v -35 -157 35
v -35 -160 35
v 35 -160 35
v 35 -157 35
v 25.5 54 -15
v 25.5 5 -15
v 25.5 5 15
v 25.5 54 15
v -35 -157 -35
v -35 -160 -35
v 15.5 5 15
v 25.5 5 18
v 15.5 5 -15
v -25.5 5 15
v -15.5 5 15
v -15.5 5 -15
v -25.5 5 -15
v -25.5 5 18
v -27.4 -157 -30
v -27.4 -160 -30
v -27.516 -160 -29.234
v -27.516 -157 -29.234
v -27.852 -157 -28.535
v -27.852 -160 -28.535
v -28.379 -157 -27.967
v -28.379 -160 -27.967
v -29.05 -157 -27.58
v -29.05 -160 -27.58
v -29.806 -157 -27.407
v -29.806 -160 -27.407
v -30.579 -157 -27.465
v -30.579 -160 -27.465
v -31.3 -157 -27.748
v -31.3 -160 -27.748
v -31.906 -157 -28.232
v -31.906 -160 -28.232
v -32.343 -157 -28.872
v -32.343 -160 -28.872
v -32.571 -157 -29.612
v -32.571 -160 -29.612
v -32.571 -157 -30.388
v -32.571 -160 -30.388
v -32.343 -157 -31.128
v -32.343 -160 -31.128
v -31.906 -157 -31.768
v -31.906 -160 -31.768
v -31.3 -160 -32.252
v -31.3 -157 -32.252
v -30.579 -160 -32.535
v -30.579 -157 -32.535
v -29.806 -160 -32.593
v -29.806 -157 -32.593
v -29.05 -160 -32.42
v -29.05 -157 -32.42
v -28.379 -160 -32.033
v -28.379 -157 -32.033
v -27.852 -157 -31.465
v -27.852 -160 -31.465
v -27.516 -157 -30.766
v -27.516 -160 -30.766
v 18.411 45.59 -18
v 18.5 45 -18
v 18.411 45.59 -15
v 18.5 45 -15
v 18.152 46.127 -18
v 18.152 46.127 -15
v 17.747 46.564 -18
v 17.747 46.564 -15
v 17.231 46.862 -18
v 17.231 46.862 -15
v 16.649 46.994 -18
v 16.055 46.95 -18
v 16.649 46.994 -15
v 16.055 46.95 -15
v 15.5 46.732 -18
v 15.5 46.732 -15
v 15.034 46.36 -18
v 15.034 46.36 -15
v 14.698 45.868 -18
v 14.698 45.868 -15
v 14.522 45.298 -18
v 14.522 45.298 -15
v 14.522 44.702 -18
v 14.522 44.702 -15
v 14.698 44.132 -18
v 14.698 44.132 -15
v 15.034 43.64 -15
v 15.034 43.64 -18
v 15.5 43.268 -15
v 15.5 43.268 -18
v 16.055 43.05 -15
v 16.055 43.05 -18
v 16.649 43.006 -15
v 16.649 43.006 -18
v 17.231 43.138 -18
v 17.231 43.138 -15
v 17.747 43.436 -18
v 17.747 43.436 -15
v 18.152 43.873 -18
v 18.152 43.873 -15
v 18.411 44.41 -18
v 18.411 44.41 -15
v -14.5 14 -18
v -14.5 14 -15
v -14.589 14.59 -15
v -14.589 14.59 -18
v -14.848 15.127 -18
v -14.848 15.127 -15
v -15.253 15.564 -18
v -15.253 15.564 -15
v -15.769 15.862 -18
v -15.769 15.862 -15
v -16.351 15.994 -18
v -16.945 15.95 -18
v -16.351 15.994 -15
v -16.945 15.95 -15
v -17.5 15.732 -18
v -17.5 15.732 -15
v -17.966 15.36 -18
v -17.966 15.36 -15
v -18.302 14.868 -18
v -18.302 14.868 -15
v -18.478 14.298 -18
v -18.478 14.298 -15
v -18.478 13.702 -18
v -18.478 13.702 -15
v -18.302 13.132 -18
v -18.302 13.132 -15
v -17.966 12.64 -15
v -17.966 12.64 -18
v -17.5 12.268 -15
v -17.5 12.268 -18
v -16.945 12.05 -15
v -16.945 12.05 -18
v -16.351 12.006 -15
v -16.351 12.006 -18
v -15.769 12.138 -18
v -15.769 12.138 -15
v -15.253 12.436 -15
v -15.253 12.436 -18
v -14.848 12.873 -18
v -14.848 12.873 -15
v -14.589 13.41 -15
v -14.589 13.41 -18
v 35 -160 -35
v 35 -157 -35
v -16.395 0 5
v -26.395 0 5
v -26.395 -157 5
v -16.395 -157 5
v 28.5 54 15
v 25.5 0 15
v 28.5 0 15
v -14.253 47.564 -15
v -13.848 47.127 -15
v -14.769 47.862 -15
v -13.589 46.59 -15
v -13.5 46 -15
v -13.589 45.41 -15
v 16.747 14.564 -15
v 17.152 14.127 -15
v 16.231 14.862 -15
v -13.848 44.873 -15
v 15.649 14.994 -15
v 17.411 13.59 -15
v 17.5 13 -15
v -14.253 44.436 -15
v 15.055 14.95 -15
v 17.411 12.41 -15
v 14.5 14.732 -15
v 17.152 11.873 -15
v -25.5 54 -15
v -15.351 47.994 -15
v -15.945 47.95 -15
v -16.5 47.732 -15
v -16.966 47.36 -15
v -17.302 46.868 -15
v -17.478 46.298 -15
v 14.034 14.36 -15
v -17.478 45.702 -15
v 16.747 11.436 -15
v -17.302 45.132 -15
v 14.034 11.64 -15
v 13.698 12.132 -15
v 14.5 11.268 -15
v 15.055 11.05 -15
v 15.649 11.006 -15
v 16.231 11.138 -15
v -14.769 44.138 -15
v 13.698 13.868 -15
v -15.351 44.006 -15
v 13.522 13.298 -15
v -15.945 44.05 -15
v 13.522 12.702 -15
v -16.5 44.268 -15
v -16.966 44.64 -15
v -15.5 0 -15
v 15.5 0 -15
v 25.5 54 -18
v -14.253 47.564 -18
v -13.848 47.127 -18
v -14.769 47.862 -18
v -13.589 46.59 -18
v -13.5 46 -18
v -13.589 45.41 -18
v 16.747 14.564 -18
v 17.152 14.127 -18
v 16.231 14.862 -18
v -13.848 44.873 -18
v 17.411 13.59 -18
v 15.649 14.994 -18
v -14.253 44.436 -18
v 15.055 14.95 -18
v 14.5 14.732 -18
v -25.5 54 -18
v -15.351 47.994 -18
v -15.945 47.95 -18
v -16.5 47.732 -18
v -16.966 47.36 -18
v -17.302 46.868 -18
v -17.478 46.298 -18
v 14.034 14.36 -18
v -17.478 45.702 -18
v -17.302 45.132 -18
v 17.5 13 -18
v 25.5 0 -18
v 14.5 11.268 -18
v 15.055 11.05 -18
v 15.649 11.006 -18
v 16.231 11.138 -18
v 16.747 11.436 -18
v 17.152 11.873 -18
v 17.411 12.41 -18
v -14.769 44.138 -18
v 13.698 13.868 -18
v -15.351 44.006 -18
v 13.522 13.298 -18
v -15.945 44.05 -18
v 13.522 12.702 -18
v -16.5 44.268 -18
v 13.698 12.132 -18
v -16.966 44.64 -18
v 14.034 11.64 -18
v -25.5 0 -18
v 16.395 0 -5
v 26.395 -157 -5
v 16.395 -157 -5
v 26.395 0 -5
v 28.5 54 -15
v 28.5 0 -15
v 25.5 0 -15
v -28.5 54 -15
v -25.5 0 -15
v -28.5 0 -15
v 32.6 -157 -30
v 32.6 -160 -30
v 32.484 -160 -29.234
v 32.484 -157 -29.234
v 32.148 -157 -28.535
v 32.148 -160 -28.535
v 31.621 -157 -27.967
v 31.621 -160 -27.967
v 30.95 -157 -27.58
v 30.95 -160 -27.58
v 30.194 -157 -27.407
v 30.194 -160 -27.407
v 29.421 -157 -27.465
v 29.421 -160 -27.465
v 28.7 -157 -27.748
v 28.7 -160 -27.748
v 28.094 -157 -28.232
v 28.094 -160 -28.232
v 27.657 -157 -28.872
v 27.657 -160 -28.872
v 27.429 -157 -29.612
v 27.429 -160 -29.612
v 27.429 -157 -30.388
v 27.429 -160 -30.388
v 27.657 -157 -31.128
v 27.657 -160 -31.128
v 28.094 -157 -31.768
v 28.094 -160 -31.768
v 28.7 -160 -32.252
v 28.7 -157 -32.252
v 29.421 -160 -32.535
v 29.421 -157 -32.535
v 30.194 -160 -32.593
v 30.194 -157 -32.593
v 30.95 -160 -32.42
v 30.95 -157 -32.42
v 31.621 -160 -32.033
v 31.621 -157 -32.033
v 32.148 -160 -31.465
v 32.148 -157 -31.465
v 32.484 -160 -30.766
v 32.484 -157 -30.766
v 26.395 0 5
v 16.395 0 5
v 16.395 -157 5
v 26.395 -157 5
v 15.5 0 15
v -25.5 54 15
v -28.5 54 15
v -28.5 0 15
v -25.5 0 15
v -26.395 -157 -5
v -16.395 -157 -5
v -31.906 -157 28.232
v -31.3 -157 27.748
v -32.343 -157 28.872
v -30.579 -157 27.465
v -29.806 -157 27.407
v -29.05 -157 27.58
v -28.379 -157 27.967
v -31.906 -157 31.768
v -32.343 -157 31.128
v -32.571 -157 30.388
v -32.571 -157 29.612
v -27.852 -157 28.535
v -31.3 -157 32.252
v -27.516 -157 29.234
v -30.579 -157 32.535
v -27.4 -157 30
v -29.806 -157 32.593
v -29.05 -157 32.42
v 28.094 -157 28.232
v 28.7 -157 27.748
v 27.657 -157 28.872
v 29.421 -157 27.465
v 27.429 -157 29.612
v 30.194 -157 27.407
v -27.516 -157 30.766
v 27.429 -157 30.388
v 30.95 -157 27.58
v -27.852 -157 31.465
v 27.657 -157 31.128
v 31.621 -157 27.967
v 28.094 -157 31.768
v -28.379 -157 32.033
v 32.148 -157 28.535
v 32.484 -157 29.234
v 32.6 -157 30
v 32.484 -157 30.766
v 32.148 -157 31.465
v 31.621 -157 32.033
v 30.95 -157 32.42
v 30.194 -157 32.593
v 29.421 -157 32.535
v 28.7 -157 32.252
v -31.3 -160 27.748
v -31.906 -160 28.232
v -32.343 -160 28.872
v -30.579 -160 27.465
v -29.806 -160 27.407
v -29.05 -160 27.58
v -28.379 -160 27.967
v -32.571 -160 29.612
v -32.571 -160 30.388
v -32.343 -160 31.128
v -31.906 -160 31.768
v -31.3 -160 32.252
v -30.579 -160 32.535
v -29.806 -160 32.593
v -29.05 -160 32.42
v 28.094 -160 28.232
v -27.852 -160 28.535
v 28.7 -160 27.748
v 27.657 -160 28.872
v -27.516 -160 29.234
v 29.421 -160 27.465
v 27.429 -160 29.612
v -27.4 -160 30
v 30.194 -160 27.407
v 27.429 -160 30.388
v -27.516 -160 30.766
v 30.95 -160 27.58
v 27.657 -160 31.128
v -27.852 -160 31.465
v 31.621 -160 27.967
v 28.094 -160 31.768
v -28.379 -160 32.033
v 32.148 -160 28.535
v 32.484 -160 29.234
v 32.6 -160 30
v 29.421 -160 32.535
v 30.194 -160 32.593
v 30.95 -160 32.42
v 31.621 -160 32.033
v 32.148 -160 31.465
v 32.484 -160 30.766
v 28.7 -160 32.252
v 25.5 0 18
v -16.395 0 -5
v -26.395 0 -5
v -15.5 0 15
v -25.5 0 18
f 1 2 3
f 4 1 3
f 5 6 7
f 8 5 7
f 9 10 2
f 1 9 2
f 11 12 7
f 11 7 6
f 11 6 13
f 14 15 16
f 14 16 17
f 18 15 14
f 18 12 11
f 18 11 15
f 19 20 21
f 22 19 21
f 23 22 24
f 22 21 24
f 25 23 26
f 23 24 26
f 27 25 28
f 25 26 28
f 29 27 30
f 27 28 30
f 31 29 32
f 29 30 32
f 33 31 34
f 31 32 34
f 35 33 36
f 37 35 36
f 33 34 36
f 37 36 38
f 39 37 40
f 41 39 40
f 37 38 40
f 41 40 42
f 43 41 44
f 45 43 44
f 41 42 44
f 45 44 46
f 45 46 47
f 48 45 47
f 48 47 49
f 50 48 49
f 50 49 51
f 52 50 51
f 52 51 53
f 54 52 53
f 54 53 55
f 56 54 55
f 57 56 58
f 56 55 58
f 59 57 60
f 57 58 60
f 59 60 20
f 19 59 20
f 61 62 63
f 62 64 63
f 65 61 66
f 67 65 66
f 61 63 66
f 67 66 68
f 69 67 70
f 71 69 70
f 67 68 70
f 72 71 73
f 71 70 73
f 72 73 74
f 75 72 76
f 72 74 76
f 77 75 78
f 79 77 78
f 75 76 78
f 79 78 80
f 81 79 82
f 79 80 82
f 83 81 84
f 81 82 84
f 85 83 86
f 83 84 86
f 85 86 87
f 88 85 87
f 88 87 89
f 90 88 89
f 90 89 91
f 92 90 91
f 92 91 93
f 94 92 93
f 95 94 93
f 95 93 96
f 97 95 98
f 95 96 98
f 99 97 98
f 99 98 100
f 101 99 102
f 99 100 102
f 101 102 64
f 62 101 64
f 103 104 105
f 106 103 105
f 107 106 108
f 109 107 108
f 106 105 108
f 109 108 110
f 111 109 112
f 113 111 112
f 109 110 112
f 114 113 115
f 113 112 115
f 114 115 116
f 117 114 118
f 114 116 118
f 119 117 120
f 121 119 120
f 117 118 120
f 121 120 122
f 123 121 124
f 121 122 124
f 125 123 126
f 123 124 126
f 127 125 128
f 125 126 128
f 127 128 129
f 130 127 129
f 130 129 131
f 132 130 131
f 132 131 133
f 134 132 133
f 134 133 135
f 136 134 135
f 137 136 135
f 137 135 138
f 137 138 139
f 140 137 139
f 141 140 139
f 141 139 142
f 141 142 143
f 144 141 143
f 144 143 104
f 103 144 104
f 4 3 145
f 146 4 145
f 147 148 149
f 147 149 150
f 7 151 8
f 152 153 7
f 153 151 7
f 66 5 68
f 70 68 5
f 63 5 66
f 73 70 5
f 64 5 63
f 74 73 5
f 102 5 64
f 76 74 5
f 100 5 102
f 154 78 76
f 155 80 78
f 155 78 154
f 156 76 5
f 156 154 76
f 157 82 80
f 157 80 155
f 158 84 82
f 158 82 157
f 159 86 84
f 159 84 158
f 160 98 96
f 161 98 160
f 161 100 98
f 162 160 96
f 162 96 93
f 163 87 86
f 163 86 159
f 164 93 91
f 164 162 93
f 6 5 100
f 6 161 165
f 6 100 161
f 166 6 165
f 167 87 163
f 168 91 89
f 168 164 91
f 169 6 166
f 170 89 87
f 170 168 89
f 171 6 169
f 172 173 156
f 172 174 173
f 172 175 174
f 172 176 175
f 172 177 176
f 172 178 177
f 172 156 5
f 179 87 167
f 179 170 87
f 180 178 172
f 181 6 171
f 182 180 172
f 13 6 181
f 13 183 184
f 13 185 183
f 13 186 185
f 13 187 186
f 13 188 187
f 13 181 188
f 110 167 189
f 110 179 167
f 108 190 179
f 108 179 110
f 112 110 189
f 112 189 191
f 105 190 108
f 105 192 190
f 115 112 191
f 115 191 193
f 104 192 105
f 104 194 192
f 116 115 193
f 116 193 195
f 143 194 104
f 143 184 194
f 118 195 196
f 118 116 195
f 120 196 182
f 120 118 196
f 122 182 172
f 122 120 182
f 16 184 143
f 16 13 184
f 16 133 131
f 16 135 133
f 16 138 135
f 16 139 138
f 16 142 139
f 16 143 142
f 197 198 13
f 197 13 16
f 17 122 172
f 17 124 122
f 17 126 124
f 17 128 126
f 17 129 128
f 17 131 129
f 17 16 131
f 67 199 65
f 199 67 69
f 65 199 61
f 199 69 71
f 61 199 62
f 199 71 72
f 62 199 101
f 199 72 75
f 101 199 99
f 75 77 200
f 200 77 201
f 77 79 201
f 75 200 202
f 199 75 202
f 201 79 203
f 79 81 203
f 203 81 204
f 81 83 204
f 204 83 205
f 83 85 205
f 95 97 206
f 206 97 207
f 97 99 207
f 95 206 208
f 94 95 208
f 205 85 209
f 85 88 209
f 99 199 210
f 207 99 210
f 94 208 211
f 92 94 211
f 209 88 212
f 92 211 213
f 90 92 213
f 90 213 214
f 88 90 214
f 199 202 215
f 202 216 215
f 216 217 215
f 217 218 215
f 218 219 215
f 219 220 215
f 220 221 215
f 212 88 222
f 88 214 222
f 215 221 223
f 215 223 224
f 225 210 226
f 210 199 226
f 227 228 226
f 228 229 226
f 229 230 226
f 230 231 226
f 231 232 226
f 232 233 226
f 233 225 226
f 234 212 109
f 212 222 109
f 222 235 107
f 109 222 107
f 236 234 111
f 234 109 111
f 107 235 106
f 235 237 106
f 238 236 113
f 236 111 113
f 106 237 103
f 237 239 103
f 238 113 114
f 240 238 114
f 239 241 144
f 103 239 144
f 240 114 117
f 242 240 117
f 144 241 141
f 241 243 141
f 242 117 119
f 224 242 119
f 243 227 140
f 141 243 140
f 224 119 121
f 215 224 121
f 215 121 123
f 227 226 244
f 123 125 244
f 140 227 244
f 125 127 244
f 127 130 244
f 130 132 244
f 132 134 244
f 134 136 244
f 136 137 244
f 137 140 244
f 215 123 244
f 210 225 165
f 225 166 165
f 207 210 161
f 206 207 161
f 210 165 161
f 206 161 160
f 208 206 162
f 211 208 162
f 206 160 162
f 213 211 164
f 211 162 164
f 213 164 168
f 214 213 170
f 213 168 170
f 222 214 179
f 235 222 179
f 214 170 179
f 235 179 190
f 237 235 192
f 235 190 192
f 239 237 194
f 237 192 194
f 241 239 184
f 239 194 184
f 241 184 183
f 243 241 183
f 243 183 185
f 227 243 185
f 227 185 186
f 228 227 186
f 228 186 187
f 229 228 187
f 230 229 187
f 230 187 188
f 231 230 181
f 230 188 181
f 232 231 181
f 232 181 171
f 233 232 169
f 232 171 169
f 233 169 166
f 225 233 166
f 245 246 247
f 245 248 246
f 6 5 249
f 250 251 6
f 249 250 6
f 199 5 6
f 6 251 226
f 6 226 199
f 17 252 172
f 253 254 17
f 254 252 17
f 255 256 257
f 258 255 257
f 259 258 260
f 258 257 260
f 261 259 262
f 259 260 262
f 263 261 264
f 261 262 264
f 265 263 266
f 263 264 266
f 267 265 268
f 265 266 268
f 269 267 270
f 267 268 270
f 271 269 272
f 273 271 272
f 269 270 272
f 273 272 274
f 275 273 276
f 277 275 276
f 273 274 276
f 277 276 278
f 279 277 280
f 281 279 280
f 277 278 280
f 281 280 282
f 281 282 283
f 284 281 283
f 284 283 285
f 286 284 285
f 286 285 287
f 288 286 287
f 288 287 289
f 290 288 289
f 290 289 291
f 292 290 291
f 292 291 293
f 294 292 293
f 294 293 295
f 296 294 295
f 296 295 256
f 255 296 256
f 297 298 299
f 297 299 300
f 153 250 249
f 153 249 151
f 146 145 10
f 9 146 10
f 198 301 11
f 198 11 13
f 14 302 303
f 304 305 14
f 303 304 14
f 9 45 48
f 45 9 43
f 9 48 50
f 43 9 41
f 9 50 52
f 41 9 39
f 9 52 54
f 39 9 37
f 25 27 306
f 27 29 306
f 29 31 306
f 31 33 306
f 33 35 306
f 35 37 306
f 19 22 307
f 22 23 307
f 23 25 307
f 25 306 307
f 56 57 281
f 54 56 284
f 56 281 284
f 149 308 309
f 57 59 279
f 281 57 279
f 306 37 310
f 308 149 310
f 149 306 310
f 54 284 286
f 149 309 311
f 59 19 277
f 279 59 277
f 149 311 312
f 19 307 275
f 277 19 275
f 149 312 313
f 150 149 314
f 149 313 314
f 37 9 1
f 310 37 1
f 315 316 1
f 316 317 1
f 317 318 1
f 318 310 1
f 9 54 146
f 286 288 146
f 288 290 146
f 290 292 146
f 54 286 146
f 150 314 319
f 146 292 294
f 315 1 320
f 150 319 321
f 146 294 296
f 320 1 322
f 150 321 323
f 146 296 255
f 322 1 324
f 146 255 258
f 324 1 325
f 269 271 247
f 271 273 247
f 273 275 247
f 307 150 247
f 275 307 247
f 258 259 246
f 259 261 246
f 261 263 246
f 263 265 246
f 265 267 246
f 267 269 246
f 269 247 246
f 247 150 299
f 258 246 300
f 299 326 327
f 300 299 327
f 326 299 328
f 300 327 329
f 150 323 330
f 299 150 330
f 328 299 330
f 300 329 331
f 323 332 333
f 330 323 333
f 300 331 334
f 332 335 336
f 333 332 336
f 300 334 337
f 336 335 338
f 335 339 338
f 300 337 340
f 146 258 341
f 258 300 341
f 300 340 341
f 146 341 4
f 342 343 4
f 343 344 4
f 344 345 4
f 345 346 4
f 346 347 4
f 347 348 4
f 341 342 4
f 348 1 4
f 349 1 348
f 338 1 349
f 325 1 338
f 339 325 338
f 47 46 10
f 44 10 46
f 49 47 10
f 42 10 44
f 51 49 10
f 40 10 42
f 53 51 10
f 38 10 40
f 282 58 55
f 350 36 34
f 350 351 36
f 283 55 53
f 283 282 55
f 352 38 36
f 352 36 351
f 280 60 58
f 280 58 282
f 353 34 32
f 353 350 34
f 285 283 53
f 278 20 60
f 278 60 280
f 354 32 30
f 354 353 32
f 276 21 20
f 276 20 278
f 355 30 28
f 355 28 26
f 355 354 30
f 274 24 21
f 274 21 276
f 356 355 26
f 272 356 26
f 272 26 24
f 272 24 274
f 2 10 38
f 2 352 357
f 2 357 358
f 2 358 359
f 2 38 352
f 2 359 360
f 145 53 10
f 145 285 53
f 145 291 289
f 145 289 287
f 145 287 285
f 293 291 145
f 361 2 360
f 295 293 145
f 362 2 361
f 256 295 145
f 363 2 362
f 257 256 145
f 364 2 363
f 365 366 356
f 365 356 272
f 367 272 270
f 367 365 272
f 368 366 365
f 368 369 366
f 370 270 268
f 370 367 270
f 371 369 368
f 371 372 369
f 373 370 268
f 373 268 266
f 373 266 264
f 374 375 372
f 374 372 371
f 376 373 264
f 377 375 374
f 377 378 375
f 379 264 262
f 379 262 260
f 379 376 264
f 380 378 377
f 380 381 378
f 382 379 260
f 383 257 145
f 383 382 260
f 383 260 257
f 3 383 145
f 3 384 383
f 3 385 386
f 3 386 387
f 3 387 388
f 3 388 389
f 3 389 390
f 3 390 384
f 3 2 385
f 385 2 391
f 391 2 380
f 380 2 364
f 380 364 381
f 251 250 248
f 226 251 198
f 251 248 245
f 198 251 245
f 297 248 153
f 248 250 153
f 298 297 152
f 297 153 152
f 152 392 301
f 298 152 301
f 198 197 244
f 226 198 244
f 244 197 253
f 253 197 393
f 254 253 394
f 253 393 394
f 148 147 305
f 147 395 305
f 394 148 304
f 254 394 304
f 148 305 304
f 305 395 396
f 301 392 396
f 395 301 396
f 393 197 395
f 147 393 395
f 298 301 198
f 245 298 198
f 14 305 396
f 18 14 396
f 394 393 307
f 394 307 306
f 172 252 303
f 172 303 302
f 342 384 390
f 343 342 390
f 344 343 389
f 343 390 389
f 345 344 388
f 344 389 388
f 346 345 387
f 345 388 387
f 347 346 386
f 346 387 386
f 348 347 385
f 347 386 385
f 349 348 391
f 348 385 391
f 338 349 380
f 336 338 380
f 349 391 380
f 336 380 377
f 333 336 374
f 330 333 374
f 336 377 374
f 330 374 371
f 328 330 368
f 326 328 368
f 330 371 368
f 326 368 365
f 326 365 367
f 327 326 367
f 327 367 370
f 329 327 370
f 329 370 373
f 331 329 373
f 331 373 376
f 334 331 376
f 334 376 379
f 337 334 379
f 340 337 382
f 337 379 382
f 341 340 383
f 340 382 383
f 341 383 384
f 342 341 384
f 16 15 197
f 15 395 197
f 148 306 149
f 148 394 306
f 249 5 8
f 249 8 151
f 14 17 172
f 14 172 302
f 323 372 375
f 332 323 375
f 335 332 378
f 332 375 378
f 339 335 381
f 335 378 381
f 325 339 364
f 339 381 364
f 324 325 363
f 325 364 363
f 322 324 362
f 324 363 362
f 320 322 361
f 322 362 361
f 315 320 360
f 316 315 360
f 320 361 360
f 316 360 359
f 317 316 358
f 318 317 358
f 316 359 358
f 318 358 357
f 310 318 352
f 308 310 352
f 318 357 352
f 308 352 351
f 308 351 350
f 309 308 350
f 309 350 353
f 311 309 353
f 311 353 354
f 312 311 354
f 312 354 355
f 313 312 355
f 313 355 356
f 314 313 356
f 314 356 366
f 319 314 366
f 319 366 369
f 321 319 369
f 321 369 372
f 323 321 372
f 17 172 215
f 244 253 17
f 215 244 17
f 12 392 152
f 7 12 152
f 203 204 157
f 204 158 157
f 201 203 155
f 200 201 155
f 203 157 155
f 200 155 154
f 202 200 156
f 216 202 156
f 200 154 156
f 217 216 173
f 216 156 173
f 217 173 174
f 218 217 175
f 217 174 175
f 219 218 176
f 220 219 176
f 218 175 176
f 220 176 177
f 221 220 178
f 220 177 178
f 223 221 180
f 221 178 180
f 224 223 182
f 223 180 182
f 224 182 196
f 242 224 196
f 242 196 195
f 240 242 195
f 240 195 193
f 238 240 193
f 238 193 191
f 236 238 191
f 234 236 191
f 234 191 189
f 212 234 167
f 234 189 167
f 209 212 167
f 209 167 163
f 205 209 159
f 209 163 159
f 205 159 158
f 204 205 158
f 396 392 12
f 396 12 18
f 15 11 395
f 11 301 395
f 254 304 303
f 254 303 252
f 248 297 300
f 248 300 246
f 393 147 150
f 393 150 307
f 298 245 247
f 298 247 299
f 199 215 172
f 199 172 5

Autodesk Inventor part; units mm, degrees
ref_plane "YZ Plane" through (0, 0, 0) normal (1, 0, 0) x (0, 1, 0)
ref_plane "XZ Plane" through (0, 0, 0) normal (0, 1, 0) x (-1, 0, 0)
ref_plane "XY Plane" through (0, 0, 0) normal (0, 0, 1) x (1, 0, 0)
sketch "Boceto1" plane through (0, 0, 0) normal (0, 1, 0) x (-1, 0, 0)
  line L0 (25.5, 15) -> (-25.5, 15)
  line L1 (-25.5, 15) -> (-25.5, -15)
  line L2 (-25.5, -15) -> (25.5, -15)
  line L3 (25.5, -15) -> (25.5, 15)
  line L4 (25.5, 15) -> (-25.5, -15) construction
  line L5 (-25.5, 15) -> (25.5, -15) construction
  line L6 (-15.5, 15) -> (-15.5, -15)
  line L7 (0, 15) -> (0, 11.847)
  line L8 (-25.5, 0) -> (-22.3332, 0)
  line L9 (25.5, 15) -> (25.5, -15)
  line L10 (15.5, 15) -> (15.5, -15)
  line L11 (25.5, 0) -> (22.3332, 0)
  line L12 (-25.5, -15) -> (-25.5, 15)
  line L13 (-25.5, 0) -> (-22.3332, 0)
  line L14 (-25.5, 15) -> (-25.5, -15)
  point P0 (0, 0)
  point P1 (31.5, 22.5)
  dimension "d2" = 10
  dimension "d21" = 51
  dimension "d22" = 30
extrude "Extrusión1" add sketch "Boceto1" along normal blind 5 contours L3 L2 L10 L0 | L6 L2 L1 L0
sketch "Boceto4" plane through (0, 0, 0) normal (0, 1, 0) x (-1, 0, 0)
  line L0 (-28.5, 18) -> (28.5, 18)
  line L1 (28.5, 18) -> (28.5, -18)
  line L2 (28.5, -18) -> (-28.5, -18)
  line L3 (-28.5, -18) -> (-28.5, 18)
  line L4 (-28.5, 18) -> (28.5, -18) construction
  line L5 (28.5, 18) -> (-28.5, -18) construction
  line L6 (28.5, -15) -> (-28.5, -15)
  line L7 (-28.5, 15) -> (28.5, 15)
  line L8 (25.5, -18) -> (25.5, 18)
  line L9 (-25.5, 18) -> (-25.5, -18)
  line L10 (-25.5, -15) -> (-15.5, -15) projected
  point P0 (0, 0)
  point P1 (-25.5, -15)
  point P2 (-25.5, 15)
  point P3 (25.5, 15)
  point P4 (25.5, -15)
  dimension "d23" = 57
  dimension "d24" = 36
  dimension "d27" = 0
extrude "Extrusión4" add sketch "Boceto4" along normal blind 5 contours L0 L8 L7 L9 | L7 L9 L6 L3 | L7 L1 L6 L8 | L6 L8 L2 L9
sketch "Boceto5" plane through (0, 5, 0) normal (0, 1, 0) x (1, 0, 0)
  line L0 (25.5, 18) -> (-25.5, 18) projected
  line L1 (25.5, 15) -> (25.5, 18) projected
  line L2 (-25.5, 18) -> (25.5, 18)
  line L3 (25.5, 18) -> (25.5, 15)
  line L4 (25.5, 15) -> (-25.5, 15)
  line L5 (-25.5, 15) -> (-25.5, 18)
  point P0 (0, 0)
extrude "Extrusión5" add sketch "Boceto5" along normal blind 49
sketch "Boceto6" plane through (-15.5, 0, -15) normal (0, 0, 1) x (1, 0, 0)
  circle A0 centre (32, 45) radius 2
  line L0 (41, 5) -> (41, 54) projected
  line L1 (-10, 54) -> (41, 54) projected
  line L2 (-10, 5) -> (-10, 54) projected
  line L3 (-10, 29.5) -> (15.5, 29.5)
  line L4 (15.5, 29.5) -> (15.5, 54)
  circle A1 centre (0, 46) radius 2
  circle A2 centre (-1, 14) radius 2
  circle A3 centre (31, 13) radius 2
  point P0 (15.5, 0)
  dimension "d30" = 4
  dimension "d31" = 9
  dimension "d32" = 9
  dimension "d35" = 360
extrude "Extrusión6" cut sketch "Boceto6" against normal blind 49 contours A0 | A1 | A2 | A3
sketch "Boceto7" plane through (0, 5, 0) normal (0, 1, 0) x (1, 0, 0)
  line L0 (-28.5, 15) -> (-28.5, -15) projected
  line L1 (-28.5, 15) -> (-25.5, 15)
  line L2 (-25.5, 15) -> (-25.5, -15)
  line L3 (-25.5, -15) -> (-28.5, -15)
  line L4 (-28.5, -15) -> (-28.5, 15)
  line L5 (28.5, 15) -> (25.5, 15) projected
  line L6 (25.5, -15) -> (28.5, -15) projected
  line L7 (28.5, 15) -> (25.5, 15)
  line L8 (25.5, 15) -> (25.5, -15)
  line L9 (25.5, -15) -> (28.5, -15)
  line L10 (28.5, -15) -> (28.5, 15)
  point P0 (0, 0)
  point P1 (25.5, -18)
extrude "Extrusión7" add sketch "Boceto7" along normal blind 49
sketch "Boceto9" plane through (0, 0, 0) normal (0, -1, 0) x (1, 0, 0)
  line L0 (-15.5, 15) -> (-15.5, -15) projected
  line L1 (-25.5, 15) -> (-15.5, 15)
  line L2 (-15.5, 0) -> (-28.5, 0)
  line L3 (-28.5, -15) -> (-28.5, 15) projected
  line L4 (-26.3951, 5) -> (-16.3951, 5)
  line L5 (-16.3951, 5) -> (-16.3951, -5)
  line L6 (-16.3951, -5) -> (-26.3951, -5)
  line L7 (-26.3951, -5) -> (-26.3951, 5)
  line L8 (-26.3951, 5) -> (-16.3951, -5) construction
  line L9 (-16.3951, 5) -> (-26.3951, -5) construction
  line L10 (26.3951, -5) -> (16.3951, -5)
  line L11 (16.3951, -5) -> (16.3951, 5)
  line L12 (16.3951, 5) -> (26.3951, 5)
  line L13 (26.3951, 5) -> (26.3951, -5)
  line L14 (26.3951, -5) -> (16.3951, 5) construction
  line L15 (16.3951, -5) -> (26.3951, 5) construction
  point P0 (0, 0)
  point P1 (-21.3951, 0)
  point P2 (21.3951, 0)
  dimension "d41" = 10
  dimension "d42" = 10
  dimension "d45" = 360
extrude "Extrusión8" add sketch "Boceto9" along normal blind 160
sketch "Boceto11" plane through (0, -160, 0) normal (0, -1, 0) x (1, 0, 0)
  line L0 (-35, 35) -> (35, 35)
  line L1 (35, 35) -> (35, -35)
  line L2 (35, -35) -> (-35, -35)
  line L3 (-35, -35) -> (-35, 35)
  line L4 (-35, 35) -> (35, -35) construction
  line L5 (35, 35) -> (-35, -35) construction
  line L6 (-35, -35) -> (35, -35)
  line L7 (35, -35) -> (35, 35)
  line L8 (35, 35) -> (-35, 35)
  line L9 (-35, 35) -> (-35, -35)
  line L10 (-35, -35) -> (35, 35) construction
  line L11 (35, -35) -> (-35, 35) construction
  line L12 (30, 30) -> (-30, 30)
  line L13 (-30, 30) -> (-30, -30)
  line L14 (-30, -30) -> (30, -30)
  line L15 (30, -30) -> (30, 30)
  line L16 (30, 30) -> (-30, -30) construction
  line L17 (-30, 30) -> (30, -30) construction
  circle A0 centre (-30, 30) radius 2.6
  circle A1 centre (30, 30) radius 2.6
  circle A2 centre (30, -30) radius 2.6
  circle A3 centre (-30, -30) radius 2.6
  line L18 (-26.3951, 5) -> (-16.3951, 5) projected
  line L19 (-16.3951, 5) -> (-16.3951, -5) projected
  line L20 (-26.3951, 5) -> (-16.3951, 5)
  line L21 (-16.3951, 5) -> (-16.3951, -5)
  line L22 (-16.3951, -5) -> (-26.3951, -5)
  line L23 (-26.3951, -5) -> (-26.3951, 5)
  line L24 (16.3951, 5) -> (26.3951, 5) projected
  line L25 (26.3951, 5) -> (26.3951, -5) projected
  line L26 (16.3951, 5) -> (26.3951, 5)
  line L27 (26.3951, 5) -> (26.3951, -5)
  line L28 (26.3951, -5) -> (16.3951, -5)
  line L29 (16.3951, -5) -> (16.3951, 5)
  point P0 (0, 0)
  point P1 (0, 0)
  dimension "d52" = 70
  dimension "d53" = 70
  dimension "d54" = 70
  dimension "d55" = 70
  dimension "d56" = 60
  dimension "d57" = 5.2
  dimension "d58" = 5.2
  dimension "d59" = 5.2
  dimension "d60" = 5.2
extrude "Extrusión9" add sketch "Boceto11" against normal blind 3 contours L0 L1 L2 L3 | L12 A1 L15 A2 L14 A3 L13 A0
properties part number "depth-camera-base"
